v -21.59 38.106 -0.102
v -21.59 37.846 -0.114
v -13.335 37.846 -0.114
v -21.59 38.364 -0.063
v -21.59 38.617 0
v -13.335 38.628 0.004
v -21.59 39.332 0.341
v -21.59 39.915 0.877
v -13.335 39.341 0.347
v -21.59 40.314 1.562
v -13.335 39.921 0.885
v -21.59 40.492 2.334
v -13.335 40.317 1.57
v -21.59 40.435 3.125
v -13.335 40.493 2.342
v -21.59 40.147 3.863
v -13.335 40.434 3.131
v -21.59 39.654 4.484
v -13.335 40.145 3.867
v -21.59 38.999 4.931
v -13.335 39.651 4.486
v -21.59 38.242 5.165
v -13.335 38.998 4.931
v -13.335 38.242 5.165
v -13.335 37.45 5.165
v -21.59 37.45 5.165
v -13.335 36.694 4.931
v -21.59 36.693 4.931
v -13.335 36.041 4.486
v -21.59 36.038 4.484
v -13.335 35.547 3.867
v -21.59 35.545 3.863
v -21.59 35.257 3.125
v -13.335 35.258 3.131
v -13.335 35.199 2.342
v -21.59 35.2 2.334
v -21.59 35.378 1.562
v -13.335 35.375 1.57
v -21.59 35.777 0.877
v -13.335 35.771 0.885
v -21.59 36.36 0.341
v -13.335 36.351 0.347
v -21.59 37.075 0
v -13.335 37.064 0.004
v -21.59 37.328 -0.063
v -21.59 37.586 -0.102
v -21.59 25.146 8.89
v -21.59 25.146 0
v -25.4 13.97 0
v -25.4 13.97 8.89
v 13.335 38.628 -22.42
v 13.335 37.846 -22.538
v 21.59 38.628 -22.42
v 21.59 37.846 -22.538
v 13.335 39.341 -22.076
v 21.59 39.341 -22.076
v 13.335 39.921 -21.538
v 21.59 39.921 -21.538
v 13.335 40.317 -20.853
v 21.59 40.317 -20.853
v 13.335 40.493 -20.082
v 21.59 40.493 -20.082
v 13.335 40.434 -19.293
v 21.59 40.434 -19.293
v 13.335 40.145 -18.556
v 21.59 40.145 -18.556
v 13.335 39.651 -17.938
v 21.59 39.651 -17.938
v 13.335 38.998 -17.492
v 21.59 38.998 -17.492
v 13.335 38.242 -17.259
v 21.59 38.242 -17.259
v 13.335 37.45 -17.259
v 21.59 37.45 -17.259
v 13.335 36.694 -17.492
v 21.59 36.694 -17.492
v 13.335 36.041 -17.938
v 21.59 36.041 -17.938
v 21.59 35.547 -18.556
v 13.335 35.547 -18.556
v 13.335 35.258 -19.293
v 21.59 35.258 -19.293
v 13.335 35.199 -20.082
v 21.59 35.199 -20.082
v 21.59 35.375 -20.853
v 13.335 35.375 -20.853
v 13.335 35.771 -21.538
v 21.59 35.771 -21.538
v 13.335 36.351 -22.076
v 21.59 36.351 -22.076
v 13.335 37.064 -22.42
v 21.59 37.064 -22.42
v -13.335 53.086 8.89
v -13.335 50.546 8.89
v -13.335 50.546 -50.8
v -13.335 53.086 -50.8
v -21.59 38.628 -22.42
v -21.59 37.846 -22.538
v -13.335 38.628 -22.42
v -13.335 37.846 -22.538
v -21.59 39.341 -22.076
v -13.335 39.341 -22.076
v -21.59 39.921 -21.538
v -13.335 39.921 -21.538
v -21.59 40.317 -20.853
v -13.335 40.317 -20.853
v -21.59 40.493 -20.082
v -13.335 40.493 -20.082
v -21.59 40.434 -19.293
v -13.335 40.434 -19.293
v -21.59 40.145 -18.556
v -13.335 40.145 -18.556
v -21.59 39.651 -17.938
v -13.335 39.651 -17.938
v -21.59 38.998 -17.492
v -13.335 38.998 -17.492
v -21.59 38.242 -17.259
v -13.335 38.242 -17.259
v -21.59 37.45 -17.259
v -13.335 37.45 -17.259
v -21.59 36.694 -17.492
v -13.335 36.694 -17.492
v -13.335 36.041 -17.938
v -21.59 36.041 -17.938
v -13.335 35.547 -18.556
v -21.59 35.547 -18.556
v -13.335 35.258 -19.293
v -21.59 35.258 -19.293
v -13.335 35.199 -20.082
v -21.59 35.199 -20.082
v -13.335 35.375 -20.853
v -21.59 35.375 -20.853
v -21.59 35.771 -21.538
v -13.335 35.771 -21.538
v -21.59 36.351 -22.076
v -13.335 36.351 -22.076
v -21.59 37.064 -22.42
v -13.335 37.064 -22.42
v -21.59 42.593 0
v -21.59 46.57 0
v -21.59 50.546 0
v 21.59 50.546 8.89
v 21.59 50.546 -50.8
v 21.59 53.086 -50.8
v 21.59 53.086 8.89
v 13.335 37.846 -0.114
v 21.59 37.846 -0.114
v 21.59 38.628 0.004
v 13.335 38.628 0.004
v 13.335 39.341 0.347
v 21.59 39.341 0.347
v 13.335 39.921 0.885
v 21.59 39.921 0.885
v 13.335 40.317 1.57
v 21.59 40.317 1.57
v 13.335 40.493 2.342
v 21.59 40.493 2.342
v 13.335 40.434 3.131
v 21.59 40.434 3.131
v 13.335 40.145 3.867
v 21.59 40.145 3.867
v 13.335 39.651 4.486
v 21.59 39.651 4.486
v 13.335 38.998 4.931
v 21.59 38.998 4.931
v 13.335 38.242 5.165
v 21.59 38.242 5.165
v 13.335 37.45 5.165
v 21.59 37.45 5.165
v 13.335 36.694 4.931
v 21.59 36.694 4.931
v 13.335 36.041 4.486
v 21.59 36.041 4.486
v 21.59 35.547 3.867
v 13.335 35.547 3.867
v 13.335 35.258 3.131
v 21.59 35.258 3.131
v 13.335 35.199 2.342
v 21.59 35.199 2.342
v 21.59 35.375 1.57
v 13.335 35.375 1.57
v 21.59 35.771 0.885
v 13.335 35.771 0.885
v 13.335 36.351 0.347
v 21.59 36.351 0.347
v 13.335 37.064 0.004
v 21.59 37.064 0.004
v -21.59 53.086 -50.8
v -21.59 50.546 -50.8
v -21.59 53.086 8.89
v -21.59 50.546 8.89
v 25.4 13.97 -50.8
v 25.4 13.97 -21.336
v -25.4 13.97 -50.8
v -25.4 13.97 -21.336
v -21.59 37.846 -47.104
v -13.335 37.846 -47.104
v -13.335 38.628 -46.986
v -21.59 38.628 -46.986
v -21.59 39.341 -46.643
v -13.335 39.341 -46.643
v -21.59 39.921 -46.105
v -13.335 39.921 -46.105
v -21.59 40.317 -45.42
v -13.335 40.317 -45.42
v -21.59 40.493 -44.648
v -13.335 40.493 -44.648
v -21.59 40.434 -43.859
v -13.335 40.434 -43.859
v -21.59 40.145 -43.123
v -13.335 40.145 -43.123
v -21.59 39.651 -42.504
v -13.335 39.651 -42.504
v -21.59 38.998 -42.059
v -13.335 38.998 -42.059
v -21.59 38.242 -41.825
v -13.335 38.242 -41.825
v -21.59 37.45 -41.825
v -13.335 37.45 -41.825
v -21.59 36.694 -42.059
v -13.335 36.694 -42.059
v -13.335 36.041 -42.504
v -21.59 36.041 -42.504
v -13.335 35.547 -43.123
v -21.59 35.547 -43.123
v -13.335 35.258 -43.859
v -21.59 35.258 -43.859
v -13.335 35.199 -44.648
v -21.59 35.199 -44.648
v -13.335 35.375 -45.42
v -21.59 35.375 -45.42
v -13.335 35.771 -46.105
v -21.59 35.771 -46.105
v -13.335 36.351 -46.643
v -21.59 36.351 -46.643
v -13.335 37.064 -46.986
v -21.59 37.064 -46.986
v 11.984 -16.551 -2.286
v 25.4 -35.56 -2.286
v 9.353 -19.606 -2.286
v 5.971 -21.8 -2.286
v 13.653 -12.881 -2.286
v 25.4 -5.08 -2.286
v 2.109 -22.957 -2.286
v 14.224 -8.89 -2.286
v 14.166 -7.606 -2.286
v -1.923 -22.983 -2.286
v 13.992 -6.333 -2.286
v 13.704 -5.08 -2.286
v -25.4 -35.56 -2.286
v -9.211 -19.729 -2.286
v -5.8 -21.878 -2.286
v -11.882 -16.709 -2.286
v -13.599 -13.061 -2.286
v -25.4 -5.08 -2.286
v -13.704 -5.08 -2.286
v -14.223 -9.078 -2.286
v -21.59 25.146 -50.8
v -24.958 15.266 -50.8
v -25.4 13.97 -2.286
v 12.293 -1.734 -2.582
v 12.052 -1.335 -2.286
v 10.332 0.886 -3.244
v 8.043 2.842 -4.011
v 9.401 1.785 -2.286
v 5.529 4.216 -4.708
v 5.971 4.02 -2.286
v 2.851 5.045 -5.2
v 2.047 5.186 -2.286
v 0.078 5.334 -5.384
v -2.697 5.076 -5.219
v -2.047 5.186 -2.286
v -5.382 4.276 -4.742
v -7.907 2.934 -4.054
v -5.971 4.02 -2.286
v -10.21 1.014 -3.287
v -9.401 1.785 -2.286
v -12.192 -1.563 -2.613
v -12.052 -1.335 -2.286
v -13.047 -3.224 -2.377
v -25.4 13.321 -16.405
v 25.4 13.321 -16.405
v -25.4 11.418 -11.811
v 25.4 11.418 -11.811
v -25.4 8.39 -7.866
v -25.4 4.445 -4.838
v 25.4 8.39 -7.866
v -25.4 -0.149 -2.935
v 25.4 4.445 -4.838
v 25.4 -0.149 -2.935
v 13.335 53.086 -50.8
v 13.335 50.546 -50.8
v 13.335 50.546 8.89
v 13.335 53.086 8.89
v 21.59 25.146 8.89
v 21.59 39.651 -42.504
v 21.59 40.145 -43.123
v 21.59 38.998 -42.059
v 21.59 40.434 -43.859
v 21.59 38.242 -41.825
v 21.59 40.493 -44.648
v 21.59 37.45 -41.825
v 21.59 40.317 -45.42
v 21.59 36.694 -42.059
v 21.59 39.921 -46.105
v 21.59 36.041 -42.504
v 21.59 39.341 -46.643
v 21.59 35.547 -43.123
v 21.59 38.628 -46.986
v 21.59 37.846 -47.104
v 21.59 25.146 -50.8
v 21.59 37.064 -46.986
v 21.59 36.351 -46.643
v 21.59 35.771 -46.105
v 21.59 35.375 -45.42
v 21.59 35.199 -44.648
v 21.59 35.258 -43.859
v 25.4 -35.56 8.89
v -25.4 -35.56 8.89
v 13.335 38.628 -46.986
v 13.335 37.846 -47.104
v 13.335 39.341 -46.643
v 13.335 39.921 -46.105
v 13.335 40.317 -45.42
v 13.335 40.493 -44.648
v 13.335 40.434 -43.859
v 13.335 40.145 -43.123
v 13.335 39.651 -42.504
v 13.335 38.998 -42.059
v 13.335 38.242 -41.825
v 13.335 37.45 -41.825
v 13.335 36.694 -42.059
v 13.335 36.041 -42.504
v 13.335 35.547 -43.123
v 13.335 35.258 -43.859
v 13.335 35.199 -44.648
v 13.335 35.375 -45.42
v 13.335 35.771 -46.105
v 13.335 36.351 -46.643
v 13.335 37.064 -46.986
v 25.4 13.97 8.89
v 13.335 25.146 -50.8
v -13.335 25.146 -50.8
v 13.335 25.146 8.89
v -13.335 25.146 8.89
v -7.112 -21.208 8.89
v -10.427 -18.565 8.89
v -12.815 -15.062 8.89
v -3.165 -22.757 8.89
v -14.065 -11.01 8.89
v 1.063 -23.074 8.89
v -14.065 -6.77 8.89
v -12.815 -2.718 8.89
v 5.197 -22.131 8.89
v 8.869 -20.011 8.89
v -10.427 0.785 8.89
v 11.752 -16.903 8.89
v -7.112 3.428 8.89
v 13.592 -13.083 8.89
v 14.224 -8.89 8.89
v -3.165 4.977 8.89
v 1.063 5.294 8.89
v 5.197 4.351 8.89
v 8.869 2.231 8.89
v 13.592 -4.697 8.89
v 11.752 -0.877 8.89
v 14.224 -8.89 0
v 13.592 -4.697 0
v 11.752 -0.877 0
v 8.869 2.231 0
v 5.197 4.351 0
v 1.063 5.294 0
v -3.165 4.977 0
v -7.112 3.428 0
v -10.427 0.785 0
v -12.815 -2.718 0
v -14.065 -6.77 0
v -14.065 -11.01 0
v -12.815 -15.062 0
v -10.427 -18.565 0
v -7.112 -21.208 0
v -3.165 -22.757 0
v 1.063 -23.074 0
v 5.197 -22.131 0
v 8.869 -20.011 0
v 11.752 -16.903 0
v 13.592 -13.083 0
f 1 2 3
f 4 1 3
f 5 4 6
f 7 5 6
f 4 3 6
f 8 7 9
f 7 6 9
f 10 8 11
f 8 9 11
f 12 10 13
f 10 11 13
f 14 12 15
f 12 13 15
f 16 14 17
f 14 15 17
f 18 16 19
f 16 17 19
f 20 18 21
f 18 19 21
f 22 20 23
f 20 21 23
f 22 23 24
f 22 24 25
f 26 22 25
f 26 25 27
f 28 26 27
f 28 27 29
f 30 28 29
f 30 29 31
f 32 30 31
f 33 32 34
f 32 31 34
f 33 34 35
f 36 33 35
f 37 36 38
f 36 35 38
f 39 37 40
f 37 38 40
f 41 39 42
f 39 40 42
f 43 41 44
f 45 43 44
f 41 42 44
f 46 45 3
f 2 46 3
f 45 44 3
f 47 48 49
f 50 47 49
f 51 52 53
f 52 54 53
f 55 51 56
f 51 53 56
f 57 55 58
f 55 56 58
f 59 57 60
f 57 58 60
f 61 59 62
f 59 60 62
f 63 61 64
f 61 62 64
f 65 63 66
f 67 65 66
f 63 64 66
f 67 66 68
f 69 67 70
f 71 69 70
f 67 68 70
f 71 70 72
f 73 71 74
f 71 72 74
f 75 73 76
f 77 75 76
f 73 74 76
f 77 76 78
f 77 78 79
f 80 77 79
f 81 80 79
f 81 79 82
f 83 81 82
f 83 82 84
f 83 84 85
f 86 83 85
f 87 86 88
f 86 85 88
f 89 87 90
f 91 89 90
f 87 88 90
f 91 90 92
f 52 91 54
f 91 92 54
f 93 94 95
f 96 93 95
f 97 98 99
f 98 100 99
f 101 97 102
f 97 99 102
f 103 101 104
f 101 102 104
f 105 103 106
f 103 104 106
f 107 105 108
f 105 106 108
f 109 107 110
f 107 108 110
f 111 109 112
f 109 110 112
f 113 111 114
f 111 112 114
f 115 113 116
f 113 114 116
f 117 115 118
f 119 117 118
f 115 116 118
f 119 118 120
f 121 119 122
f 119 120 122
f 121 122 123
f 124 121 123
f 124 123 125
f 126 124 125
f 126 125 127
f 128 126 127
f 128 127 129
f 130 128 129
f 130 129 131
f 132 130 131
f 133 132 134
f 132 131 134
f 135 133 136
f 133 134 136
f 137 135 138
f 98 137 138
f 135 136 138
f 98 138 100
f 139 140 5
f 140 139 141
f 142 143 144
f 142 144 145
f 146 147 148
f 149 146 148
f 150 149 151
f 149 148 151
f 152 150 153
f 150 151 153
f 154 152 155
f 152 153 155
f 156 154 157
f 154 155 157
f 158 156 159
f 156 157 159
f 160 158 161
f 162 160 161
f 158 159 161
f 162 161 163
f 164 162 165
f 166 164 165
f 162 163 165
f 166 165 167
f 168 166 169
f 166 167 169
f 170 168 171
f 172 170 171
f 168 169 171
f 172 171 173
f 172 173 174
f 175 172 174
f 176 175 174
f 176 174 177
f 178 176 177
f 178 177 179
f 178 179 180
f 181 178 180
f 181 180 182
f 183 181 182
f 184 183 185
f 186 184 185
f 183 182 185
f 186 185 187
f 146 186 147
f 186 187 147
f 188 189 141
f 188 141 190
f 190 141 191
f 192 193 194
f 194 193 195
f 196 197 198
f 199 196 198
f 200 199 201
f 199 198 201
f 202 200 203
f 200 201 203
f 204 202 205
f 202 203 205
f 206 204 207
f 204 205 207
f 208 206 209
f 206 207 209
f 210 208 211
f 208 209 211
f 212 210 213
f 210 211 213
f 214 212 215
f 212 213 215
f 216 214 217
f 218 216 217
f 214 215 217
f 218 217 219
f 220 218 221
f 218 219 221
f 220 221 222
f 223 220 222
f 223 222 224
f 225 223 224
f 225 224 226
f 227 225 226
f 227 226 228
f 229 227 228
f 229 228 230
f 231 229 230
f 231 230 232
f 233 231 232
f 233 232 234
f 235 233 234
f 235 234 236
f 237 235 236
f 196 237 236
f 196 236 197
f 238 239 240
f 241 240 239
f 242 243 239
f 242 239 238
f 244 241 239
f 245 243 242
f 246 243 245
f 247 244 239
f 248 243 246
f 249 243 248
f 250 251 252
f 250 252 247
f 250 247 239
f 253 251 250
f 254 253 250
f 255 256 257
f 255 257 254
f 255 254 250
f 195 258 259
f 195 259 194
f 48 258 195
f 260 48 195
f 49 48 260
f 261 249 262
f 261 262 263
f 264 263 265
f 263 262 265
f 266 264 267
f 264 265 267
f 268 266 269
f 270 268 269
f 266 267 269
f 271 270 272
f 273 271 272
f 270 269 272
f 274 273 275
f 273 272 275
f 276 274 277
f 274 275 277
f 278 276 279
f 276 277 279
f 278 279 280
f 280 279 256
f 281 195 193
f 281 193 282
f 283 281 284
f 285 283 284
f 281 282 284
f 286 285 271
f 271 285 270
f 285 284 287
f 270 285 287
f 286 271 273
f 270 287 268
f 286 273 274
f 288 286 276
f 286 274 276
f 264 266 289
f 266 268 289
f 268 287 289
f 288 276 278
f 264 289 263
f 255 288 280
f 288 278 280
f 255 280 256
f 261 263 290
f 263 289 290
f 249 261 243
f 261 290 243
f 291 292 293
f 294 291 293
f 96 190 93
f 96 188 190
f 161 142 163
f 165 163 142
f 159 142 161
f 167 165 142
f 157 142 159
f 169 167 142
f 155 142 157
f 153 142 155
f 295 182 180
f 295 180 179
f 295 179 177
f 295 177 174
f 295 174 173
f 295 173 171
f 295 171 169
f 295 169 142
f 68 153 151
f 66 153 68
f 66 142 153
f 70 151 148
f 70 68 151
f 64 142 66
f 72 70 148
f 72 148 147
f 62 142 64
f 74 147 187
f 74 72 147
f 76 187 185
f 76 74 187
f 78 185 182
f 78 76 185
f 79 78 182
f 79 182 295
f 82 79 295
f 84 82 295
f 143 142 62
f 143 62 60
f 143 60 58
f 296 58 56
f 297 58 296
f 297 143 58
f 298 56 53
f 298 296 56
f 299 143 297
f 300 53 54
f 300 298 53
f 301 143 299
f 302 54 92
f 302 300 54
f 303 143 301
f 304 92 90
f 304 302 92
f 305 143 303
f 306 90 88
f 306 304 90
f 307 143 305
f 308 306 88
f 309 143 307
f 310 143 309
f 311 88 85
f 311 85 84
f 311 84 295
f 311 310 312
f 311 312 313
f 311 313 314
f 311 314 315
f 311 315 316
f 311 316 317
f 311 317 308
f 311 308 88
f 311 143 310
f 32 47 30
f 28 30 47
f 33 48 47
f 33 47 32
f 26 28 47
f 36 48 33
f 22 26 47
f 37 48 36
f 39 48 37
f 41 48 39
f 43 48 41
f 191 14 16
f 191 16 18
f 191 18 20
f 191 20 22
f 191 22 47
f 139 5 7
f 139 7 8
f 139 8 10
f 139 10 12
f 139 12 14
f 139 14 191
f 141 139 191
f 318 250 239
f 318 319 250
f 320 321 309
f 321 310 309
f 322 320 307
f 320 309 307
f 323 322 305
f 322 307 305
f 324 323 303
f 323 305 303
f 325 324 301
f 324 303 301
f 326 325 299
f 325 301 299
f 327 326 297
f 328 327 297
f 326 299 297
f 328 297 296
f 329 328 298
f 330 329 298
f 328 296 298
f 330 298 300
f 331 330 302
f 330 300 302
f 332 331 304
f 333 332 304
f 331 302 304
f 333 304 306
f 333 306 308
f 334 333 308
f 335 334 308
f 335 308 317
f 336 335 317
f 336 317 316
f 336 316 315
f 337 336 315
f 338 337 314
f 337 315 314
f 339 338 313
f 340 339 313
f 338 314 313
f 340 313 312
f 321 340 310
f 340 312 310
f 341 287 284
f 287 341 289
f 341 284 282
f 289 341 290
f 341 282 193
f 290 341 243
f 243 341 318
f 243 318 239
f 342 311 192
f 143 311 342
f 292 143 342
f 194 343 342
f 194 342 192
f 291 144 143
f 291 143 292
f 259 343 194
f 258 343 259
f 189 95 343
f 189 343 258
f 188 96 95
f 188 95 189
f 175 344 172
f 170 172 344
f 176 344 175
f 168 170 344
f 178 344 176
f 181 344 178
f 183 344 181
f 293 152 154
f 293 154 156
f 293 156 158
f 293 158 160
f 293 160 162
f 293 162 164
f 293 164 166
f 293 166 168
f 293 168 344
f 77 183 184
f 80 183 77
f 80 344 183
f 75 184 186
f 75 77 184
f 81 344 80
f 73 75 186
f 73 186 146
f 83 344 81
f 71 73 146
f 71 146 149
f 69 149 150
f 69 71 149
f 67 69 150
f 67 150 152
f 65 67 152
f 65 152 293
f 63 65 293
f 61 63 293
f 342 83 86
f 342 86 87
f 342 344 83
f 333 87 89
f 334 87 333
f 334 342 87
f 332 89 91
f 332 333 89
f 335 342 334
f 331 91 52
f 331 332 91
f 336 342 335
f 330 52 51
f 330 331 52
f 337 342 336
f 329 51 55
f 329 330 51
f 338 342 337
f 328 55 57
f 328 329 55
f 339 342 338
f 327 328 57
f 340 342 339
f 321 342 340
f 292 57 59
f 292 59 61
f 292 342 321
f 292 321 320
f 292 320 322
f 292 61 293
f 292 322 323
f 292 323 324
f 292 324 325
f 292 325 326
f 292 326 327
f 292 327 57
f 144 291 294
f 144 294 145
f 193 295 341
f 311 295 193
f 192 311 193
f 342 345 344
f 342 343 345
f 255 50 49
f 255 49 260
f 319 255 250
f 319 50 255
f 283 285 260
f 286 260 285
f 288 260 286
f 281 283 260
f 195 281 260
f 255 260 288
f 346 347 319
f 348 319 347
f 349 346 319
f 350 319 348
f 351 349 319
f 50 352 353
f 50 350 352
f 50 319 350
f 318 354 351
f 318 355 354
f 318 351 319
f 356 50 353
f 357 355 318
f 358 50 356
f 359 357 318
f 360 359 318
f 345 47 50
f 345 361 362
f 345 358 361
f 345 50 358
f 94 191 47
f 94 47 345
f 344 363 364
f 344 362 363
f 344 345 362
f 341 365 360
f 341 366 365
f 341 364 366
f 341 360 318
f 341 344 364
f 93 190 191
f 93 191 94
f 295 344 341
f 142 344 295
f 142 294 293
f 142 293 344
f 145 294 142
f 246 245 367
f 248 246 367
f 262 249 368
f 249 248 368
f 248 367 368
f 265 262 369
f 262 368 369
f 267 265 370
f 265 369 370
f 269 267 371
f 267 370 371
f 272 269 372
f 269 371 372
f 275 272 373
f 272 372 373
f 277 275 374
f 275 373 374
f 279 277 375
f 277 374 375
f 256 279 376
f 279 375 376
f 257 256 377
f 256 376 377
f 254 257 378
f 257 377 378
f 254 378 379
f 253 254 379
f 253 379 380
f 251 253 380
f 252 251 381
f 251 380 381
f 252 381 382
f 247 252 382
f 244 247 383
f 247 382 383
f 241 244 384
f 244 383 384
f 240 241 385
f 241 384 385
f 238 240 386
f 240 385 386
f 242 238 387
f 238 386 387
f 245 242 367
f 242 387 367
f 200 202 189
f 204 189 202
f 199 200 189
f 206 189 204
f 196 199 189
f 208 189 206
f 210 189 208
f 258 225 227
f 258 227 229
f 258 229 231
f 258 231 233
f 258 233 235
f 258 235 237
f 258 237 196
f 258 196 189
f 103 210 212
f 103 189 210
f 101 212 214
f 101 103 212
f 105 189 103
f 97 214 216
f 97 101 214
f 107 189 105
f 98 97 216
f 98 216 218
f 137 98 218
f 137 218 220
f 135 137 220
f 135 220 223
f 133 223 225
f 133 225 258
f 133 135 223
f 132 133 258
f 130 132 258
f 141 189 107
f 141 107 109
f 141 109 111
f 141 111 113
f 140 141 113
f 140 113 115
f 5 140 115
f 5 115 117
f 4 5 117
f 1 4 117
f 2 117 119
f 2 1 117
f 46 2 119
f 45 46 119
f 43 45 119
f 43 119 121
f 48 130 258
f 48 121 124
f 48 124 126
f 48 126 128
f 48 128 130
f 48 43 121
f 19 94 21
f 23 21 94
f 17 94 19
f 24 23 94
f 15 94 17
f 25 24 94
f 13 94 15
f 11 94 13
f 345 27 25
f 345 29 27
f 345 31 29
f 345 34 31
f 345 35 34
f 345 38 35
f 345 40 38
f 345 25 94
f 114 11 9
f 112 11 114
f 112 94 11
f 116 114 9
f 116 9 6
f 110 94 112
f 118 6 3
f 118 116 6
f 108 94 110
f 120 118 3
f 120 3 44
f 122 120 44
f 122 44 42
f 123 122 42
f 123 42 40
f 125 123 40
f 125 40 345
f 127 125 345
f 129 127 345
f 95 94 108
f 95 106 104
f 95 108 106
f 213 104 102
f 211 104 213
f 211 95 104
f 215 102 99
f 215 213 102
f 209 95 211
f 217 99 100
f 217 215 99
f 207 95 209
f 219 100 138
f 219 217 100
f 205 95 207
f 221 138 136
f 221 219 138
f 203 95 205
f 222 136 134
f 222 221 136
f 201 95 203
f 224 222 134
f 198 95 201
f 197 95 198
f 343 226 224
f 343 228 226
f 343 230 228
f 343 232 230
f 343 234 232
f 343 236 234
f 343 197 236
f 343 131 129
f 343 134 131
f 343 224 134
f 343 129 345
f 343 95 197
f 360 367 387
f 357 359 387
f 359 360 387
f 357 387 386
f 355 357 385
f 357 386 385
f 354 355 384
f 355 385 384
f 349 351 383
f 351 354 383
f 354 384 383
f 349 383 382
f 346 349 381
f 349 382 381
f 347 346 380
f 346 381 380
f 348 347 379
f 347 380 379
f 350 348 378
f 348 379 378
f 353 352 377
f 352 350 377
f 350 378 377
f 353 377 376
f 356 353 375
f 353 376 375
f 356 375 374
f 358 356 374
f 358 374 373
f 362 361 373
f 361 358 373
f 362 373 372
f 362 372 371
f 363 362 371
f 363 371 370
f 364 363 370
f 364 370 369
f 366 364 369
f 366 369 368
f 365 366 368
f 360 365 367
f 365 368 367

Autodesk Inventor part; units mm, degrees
ref_plane "YZ Plane" through (0, 0, 0) normal (1, 0, 0) x (0, 1, 0)
ref_plane "XZ Plane" through (0, 0, 0) normal (0, 1, 0) x (-1, 0, 0)
ref_plane "XY Plane" through (0, 0, 0) normal (0, 0, 1) x (1, 0, 0)
sketch "Sketch1" plane through (0, 0, 0) normal (0, 0, 1) x (1, 0, 0)
  line L0 (-25.4, -35.56) -> (25.4, -35.56)
  line L1 (25.4, -35.56) -> (25.4, 13.97)
  line L2 (25.4, 13.97) -> (-25.4, 13.97)
  line L3 (-25.4, 13.97) -> (-25.4, -35.56)
  line L4 (-25.4, -35.56) -> (25.4, 13.97) construction
  line L5 (25.4, -35.56) -> (-25.4, 13.97) construction
  line L6 (0, 25.146) -> (-12.7, 25.146)
  line L7 (-12.7, 25.146) -> (12.7, 25.146)
  line L8 (-12.7, 25.146) -> (-25.4, 13.97)
  line L9 (12.7, 25.146) -> (25.4, 13.97)
  line L10 (-12.7, 25.146) -> (-21.59, 25.146)
  line L11 (-21.59, 25.146) -> (-21.59, 50.546)
  line L12 (-21.59, 50.546) -> (-12.7, 50.546)
  line L13 (-12.7, 50.546) -> (-12.7, 25.146)
  line L14 (-21.59, 25.146) -> (-25.4, 13.97)
  line L15 (12.7, 25.146) -> (12.7, 50.546)
  line L16 (12.7, 50.546) -> (21.59, 50.546)
  line L17 (21.59, 50.546) -> (21.59, 25.146)
  line L18 (21.59, 25.146) -> (25.4, 13.97)
  line L19 (12.7, 25.146) -> (21.59, 25.146)
  circle A0 centre (0, -8.89) radius 14.224
  point P0 (0, 0)
  dimension "d1" = 49.53
  dimension "d2" = 50.8
  dimension "d6" = 8.89
  dimension "d7" = 25.4
  dimension "d8" = 8.89
  dimension "d47" = 11.176
  dimension "d51" = 28.448
  dimension "d52" = 34.036
  dimension "d53" = 43.18
extrude "Extrusion1" add sketch "Sketch1" along normal blind 8.89
sketch "Sketch3" plane through (0, 0, 0) normal (0, 0, -1) x (-1, 0, 0)
  circle A0 centre (0, 0) radius 14.224
  line L0 (21.5903, 3.302) -> (-21.59, 3.302)
  line L1 (-21.59, 3.302) -> (-21.59, 25.146)
  line L2 (-21.59, 25.146) -> (21.5903, 25.146)
  line L3 (21.5903, 25.146) -> (21.5903, 3.302)
  circle A1 centre (0, 0) radius 14.224 projected
  line L4 (21.5903, 3.302) -> (-21.59, 25.146) construction
  line L5 (-21.59, 3.302) -> (21.5903, 25.146) construction
  line L6 (-25.4, -35.56) -> (-25.4, 13.97) projected
  line L7 (25.4, 13.97) -> (25.4, -35.56) projected
  line L8 (25.4, -35.56) -> (-25.4, -35.56) projected
  line L9 (25.4, 13.97) -> (25.4, -35.56) projected
  line L10 (21.59, 25.146) -> (25.4, 13.97) projected
  line L11 (21.59, 50.546) -> (21.59, 25.146) projected
  line L12 (12.7, 50.546) -> (21.59, 50.546) projected
  line L13 (12.7, 25.146) -> (12.7, 50.546) projected
  line L14 (-12.7, 25.146) -> (12.7, 25.146) projected
  line L15 (-12.7, 50.546) -> (-12.7, 25.146) projected
  line L16 (-21.59, 50.546) -> (-12.7, 50.546) projected
  line L17 (-21.59, 25.146) -> (-21.59, 50.546) projected
  line L18 (-25.4, 13.97) -> (-21.59, 25.146) projected
  line L19 (-25.4, -35.56) -> (-25.4, 13.97) projected
  line L20 (25.4, 3.302) -> (21.5903, 3.302)
  line L21 (-25.4, 3.302) -> (-21.59, 3.302)
  line L22 (0, 14.224) -> (-25.4, 14.224)
  point P0 (0.0002, 14.224)
  point P1 (-25.4, 13.97)
  point P2 (-13.8354, 3.302)
  point P3 (13.8354, 3.302)
  dimension "d13" = 28.448
extrude "Extrusion3" add sketch "Sketch3" along normal blind 50.8 contours A0 L22 L1 L2 L3 L0 | L0 L1 L22 A0 | L3 L10 L7 L20 | L21 L6 L18 L22 L1 | L22 L18 L1 | L2 L13 L12 L11 | L17 L16 L15 L2
sketch "Sketch5" plane through (21.59, 50.546, 8.89) normal (1, 0, 0) x (0, 0, -1)
  line L0 (59.69, -25.4) -> (59.69, 0) projected
  line L1 (0, -23.5788) -> (57.5469, -23.5788) projected
  line L2 (57.5469, 0) -> (57.5469, -23.5788)
  line L3 (59.69, 0) -> (59.69, -25.4) projected
  line L4 (59.69, 0) -> (0, 0) projected
  line L5 (0, -25.4) -> (0, 0) projected
  line L6 (59.69, -25.4) -> (0, -25.4) projected
  line L7 (0, -25.4) -> (0, -12.7)
  line L8 (0, -12.7) -> (57.5469, -12.7)
  circle A0 centre (6.35, -12.7) radius 2.6543
  circle A1 centre (53.34, -12.7) radius 2.6543
  circle A2 centre (28.7734, -12.7) radius 2.6543
  point P0 (8.89, -50.546)
  point P1 (59.69, -25.4)
  point P2 (31.4277, -12.7)
  point P3 (26.1191, -12.7)
  point P4 (55.9943, -12.7)
  point P5 (50.6857, -12.7)
  point P6 (9.0043, -12.7)
  point P7 (3.6957, -12.7)
  dimension "d39" = 12.7
  dimension "d40" = 5.3086
  dimension "d41" = 6.35
  dimension "d42" = 5.3086
  dimension "d43" = 6.35
  dimension "d44" = 5.3086
  dimension "d46" = 0
extrude "Extrusion4" cut sketch "Sketch5" against normal up to surface (43.18 mm away) contours A1 L8 | L8 A1 | A0 L8 | L8 A0 | A2 L8 | L8 A2
sketch "Sketch9" plane through (0, 0, -50.8) normal (0, 0, -1) x (-1, 0, 0)
  line L0 (-21.59, 50.546) -> (-12.7, 50.546) projected
  line L1 (13.335, -0.254) -> (-13.335, -0.254)
  line L2 (-13.335, -0.254) -> (-13.335, 50.546)
  line L3 (-13.335, 50.546) -> (13.335, 50.546)
  line L4 (13.335, 50.546) -> (13.335, -0.254)
  line L5 (-12.7, 25.146) -> (12.7, 25.146) projected
  line L6 (13.335, -0.254) -> (-13.335, 50.546) construction
  line L7 (-13.335, -0.254) -> (13.335, 50.546) construction
  line L8 (-25.4, -35.56) -> (-25.4, 13.97) projected
  line L9 (25.4, -13.97) -> (-25.4, -13.97)
  line L10 (-25.4, -13.97) -> (-25.4, 13.97)
  line L11 (-25.4, 13.97) -> (25.4, 13.97)
  line L12 (25.4, 13.97) -> (25.4, -13.97)
  line L13 (25.4, -13.97) -> (-25.4, 13.97) construction
  line L14 (-25.4, -13.97) -> (25.4, 13.97) construction
  point P0 (0, 0)
  point P1 (0, 25.146)
  point P2 (-13.335, 13.97)
  point P3 (13.335, 13.97)
  point P4 (-12.7, 50.546)
  dimension "d27" = 26.67
extrude "Extrusion5" cut sketch "Sketch9" against normal blind 42.8625
sketch "Sketch11" plane through (0, 0, 0) normal (0, 0, -1) x (-1, 0, 0)
  line L0 (25.4, 3.302) -> (13.8354, 3.302) projected
  line L1 (-13.8354, 3.302) -> (-25.4, 3.302) projected
  line L2 (-25.4, -35.56) -> (-25.4, 3.302) projected
  line L3 (25.4, -35.56) -> (-25.4, -35.56) projected
  line L4 (25.4, 3.302) -> (25.4, -35.56) projected
  line L5 (12.7, 25.146) -> (12.7, 50.546) projected
  line L6 (-12.7, 25.146) -> (12.7, 25.146) projected
  line L7 (-12.7, 50.546) -> (-12.7, 25.146) projected
  line L8 (-13.335, 50.546) -> (-12.7, 50.546) projected
  line L9 (-13.335, 13.97) -> (-13.335, 50.546) projected
  line L10 (-25.4, 13.97) -> (-13.335, 13.97) projected
  line L11 (-25.4, 3.302) -> (-25.4, 13.97) projected
  line L12 (-13.8354, 3.302) -> (-25.4, 3.302) projected
  arc A0 (13.8354, 3.302) -> (-13.8354, 3.302) centre (0, 0) ccw projected
  line L13 (25.4, 3.302) -> (13.8354, 3.302) projected
  line L14 (25.4, 13.97) -> (25.4, 3.302) projected
  line L15 (13.335, 13.97) -> (25.4, 13.97) projected
  line L16 (13.335, 50.546) -> (13.335, 13.97) projected
  line L17 (12.7, 50.546) -> (13.335, 50.546) projected
  arc A1 (13.8354, 3.302) -> (-13.8354, 3.302) centre (0, 0) ccw projected
extrude "Extrusion6" add sketch "Sketch11" along normal blind 2.286 contours L4 L3 L2 L1 A0 L0
sketch "Sketch12" plane through (0, 0, -7.9375) normal (0, 0, -1) x (-1, 0, 0)
  line L0 (12.7, 25.146) -> (12.7, 50.546) projected
  line L1 (-12.7, 25.146) -> (12.7, 25.146) projected
  line L2 (-12.7, 50.546) -> (-12.7, 25.146) projected
  line L3 (-13.335, 50.546) -> (-12.7, 50.546) projected
  line L4 (-13.335, 13.97) -> (-13.335, 50.546) projected
  line L5 (-25.4, 13.97) -> (-13.335, 13.97) projected
  line L6 (-25.4, 3.302) -> (-25.4, 13.97) projected
  line L7 (-13.8354, 3.302) -> (-25.4, 3.302) projected
  arc A0 (13.8354, 3.302) -> (-13.8354, 3.302) centre (0, 0) ccw projected
  line L8 (25.4, 3.302) -> (13.8354, 3.302) projected
  line L9 (25.4, 13.97) -> (25.4, 3.302) projected
  line L10 (13.335, 13.97) -> (25.4, 13.97) projected
  line L11 (13.335, 50.546) -> (13.335, 13.97) projected
  line L12 (12.7, 50.546) -> (13.335, 50.546) projected
extrude "Extrusion7" cut sketch "Sketch12" against normal blind 5.6515
sketch "Sketch13" plane through (0, 0, -2.286) normal (0, 0, -1) x (-1, 0, 0)
  line L0 (-12.7, 25.146) -> (12.7, 25.146) projected
  line L1 (-13.335, 13.97) -> (-13.335, 50.546) projected
  line L2 (12.7, 25.146) -> (-13.335, 25.146)
  line L3 (-13.335, 25.146) -> (-13.335, 50.546)
  line L4 (-13.335, 50.546) -> (12.7, 50.546)
  line L5 (12.7, 50.546) -> (12.7, 25.146)
  line L6 (13.335, 50.546) -> (13.335, 13.97) projected
  line L7 (12.7, 50.546) -> (13.335, 50.546)
  line L8 (13.335, 50.546) -> (13.335, 25.146)
  line L9 (13.335, 25.146) -> (12.7, 25.146)
  line L10 (12.7, 25.146) -> (12.7, 50.546)
  point P0 (0, 0)
  point P1 (-13.335, 25.146)
extrude "Extrusion8" cut sketch "Sketch13" against normal blind 37.211
sketch "Sketch14" plane through (0, 0, -2.286) normal (0, 0, -1) x (-1, 0, 0)
  circle A0 centre (0, 0) radius 14.224 projected
  line L0 (25.4, 13.97) -> (25.4, -35.56) projected
  line L1 (13.335, 25.146) -> (-13.335, 25.146) projected
  line L2 (-13.335, 13.97) -> (-13.335, 25.146) projected
  line L3 (-25.4, 13.97) -> (-13.335, 13.97) projected
  line L4 (-25.4, -35.56) -> (-25.4, 13.97) projected
  line L5 (-25.4, -35.56) -> (25.4, -35.56) projected
  line L6 (25.4, 13.97) -> (25.4, -35.56) projected
  line L7 (13.335, 13.97) -> (25.4, 13.97) projected
  line L8 (13.335, 25.146) -> (13.335, 13.97) projected
  line L9 (-13.335, 13.97) -> (-13.335, 50.546) projected
  line L10 (-13.335, 50.546) -> (-21.59, 50.546) projected
  line L11 (-21.59, 50.546) -> (-21.59, 25.146) projected
  line L12 (-21.59, 25.146) -> (-25.4, 13.97) projected
  line L13 (-25.4, 13.97) -> (-13.335, 13.97) projected
  line L14 (13.335, 50.546) -> (13.335, 13.97) projected
  line L15 (13.335, 13.97) -> (25.4, 13.97) projected
  line L16 (25.4, 13.97) -> (21.59, 25.146) projected
  line L17 (21.59, 25.146) -> (21.59, 50.546) projected
  line L18 (21.59, 50.546) -> (13.335, 50.546) projected
  line L19 (-21.59, 25.146) -> (21.59, 25.146)
  line L20 (-25.4, 15.2659) -> (25.4, 15.2659)
  point P0 (25.4, 14.224)
  point P1 (25.4, 13.97)
  point P2 (-25.4, 13.97)
  point P3 (25.4, 13.97)
  point P4 (24.9582, 15.2659)
  point P5 (13.335, 15.2659)
  point P6 (-13.335, 15.2659)
  point P7 (-24.9582, 15.2659)
extrude "Extrusion9" add sketch "Sketch14" along normal up to surface (48.514 mm away) contours L20 L8 L19 L16 | L20 L2 L1 L8 | L20 L12 L19 L2
sketch "Sketch15" plane through (0, -8.89, 0) normal (0, 0, 1) x (1, 0, 0)
  circle A0 centre (0, 0) radius 14.224 projected
  point P0 (0, 8.89)
extrude "Extrusion10" cut sketch "Sketch15" against normal blind 33.9725
sketch "Sketch16" plane through (-21.59, 50.546, 8.89) normal (0, 1, 0) x (1, 0, 0)
  line L0 (8.255, 0) -> (8.255, 59.69) projected
  line L1 (0, 59.69) -> (8.255, 59.69) projected
  line L2 (0, 59.69) -> (0, 0) projected
  line L3 (8.255, 0) -> (0, 0) projected
  line L4 (34.925, 59.69) -> (34.925, 0) projected
  line L5 (43.18, 0) -> (34.925, 0) projected
  line L6 (43.18, 59.69) -> (43.18, 0) projected
  line L7 (34.925, 59.69) -> (43.18, 59.69) projected
  point P0 (21.59, 8.89)
extrude "Extrusion11" add sketch "Sketch16" along normal blind 2.54
sketch "Sketch17" plane through (0, 0, -2.286) normal (0, 0, -1) x (-1, 0, 0)
  line L0 (-25.4, 13.97) -> (-13.335, 13.97) projected
  line L1 (13.335, 15.2659) -> (13.335, 13.97) projected
  line L2 (-13.335, 13.97) -> (13.335, 13.97)
  line L3 (13.335, 13.97) -> (13.335, 15.2659)
  line L4 (13.335, 15.2659) -> (-13.335, 15.2659)
  line L5 (-13.335, 15.2659) -> (-13.335, 13.97)
  point P0 (0, 0)
extrude "Extrusion12" add sketch "Sketch17" along normal up to surface (48.514 mm away)
fillet "Fillet5" radius 19.05 1 edges at (0, 13.97, -2.286)
equation "\"d9\" = d6"
properties part number "CH-4_DiffBarSupport"
